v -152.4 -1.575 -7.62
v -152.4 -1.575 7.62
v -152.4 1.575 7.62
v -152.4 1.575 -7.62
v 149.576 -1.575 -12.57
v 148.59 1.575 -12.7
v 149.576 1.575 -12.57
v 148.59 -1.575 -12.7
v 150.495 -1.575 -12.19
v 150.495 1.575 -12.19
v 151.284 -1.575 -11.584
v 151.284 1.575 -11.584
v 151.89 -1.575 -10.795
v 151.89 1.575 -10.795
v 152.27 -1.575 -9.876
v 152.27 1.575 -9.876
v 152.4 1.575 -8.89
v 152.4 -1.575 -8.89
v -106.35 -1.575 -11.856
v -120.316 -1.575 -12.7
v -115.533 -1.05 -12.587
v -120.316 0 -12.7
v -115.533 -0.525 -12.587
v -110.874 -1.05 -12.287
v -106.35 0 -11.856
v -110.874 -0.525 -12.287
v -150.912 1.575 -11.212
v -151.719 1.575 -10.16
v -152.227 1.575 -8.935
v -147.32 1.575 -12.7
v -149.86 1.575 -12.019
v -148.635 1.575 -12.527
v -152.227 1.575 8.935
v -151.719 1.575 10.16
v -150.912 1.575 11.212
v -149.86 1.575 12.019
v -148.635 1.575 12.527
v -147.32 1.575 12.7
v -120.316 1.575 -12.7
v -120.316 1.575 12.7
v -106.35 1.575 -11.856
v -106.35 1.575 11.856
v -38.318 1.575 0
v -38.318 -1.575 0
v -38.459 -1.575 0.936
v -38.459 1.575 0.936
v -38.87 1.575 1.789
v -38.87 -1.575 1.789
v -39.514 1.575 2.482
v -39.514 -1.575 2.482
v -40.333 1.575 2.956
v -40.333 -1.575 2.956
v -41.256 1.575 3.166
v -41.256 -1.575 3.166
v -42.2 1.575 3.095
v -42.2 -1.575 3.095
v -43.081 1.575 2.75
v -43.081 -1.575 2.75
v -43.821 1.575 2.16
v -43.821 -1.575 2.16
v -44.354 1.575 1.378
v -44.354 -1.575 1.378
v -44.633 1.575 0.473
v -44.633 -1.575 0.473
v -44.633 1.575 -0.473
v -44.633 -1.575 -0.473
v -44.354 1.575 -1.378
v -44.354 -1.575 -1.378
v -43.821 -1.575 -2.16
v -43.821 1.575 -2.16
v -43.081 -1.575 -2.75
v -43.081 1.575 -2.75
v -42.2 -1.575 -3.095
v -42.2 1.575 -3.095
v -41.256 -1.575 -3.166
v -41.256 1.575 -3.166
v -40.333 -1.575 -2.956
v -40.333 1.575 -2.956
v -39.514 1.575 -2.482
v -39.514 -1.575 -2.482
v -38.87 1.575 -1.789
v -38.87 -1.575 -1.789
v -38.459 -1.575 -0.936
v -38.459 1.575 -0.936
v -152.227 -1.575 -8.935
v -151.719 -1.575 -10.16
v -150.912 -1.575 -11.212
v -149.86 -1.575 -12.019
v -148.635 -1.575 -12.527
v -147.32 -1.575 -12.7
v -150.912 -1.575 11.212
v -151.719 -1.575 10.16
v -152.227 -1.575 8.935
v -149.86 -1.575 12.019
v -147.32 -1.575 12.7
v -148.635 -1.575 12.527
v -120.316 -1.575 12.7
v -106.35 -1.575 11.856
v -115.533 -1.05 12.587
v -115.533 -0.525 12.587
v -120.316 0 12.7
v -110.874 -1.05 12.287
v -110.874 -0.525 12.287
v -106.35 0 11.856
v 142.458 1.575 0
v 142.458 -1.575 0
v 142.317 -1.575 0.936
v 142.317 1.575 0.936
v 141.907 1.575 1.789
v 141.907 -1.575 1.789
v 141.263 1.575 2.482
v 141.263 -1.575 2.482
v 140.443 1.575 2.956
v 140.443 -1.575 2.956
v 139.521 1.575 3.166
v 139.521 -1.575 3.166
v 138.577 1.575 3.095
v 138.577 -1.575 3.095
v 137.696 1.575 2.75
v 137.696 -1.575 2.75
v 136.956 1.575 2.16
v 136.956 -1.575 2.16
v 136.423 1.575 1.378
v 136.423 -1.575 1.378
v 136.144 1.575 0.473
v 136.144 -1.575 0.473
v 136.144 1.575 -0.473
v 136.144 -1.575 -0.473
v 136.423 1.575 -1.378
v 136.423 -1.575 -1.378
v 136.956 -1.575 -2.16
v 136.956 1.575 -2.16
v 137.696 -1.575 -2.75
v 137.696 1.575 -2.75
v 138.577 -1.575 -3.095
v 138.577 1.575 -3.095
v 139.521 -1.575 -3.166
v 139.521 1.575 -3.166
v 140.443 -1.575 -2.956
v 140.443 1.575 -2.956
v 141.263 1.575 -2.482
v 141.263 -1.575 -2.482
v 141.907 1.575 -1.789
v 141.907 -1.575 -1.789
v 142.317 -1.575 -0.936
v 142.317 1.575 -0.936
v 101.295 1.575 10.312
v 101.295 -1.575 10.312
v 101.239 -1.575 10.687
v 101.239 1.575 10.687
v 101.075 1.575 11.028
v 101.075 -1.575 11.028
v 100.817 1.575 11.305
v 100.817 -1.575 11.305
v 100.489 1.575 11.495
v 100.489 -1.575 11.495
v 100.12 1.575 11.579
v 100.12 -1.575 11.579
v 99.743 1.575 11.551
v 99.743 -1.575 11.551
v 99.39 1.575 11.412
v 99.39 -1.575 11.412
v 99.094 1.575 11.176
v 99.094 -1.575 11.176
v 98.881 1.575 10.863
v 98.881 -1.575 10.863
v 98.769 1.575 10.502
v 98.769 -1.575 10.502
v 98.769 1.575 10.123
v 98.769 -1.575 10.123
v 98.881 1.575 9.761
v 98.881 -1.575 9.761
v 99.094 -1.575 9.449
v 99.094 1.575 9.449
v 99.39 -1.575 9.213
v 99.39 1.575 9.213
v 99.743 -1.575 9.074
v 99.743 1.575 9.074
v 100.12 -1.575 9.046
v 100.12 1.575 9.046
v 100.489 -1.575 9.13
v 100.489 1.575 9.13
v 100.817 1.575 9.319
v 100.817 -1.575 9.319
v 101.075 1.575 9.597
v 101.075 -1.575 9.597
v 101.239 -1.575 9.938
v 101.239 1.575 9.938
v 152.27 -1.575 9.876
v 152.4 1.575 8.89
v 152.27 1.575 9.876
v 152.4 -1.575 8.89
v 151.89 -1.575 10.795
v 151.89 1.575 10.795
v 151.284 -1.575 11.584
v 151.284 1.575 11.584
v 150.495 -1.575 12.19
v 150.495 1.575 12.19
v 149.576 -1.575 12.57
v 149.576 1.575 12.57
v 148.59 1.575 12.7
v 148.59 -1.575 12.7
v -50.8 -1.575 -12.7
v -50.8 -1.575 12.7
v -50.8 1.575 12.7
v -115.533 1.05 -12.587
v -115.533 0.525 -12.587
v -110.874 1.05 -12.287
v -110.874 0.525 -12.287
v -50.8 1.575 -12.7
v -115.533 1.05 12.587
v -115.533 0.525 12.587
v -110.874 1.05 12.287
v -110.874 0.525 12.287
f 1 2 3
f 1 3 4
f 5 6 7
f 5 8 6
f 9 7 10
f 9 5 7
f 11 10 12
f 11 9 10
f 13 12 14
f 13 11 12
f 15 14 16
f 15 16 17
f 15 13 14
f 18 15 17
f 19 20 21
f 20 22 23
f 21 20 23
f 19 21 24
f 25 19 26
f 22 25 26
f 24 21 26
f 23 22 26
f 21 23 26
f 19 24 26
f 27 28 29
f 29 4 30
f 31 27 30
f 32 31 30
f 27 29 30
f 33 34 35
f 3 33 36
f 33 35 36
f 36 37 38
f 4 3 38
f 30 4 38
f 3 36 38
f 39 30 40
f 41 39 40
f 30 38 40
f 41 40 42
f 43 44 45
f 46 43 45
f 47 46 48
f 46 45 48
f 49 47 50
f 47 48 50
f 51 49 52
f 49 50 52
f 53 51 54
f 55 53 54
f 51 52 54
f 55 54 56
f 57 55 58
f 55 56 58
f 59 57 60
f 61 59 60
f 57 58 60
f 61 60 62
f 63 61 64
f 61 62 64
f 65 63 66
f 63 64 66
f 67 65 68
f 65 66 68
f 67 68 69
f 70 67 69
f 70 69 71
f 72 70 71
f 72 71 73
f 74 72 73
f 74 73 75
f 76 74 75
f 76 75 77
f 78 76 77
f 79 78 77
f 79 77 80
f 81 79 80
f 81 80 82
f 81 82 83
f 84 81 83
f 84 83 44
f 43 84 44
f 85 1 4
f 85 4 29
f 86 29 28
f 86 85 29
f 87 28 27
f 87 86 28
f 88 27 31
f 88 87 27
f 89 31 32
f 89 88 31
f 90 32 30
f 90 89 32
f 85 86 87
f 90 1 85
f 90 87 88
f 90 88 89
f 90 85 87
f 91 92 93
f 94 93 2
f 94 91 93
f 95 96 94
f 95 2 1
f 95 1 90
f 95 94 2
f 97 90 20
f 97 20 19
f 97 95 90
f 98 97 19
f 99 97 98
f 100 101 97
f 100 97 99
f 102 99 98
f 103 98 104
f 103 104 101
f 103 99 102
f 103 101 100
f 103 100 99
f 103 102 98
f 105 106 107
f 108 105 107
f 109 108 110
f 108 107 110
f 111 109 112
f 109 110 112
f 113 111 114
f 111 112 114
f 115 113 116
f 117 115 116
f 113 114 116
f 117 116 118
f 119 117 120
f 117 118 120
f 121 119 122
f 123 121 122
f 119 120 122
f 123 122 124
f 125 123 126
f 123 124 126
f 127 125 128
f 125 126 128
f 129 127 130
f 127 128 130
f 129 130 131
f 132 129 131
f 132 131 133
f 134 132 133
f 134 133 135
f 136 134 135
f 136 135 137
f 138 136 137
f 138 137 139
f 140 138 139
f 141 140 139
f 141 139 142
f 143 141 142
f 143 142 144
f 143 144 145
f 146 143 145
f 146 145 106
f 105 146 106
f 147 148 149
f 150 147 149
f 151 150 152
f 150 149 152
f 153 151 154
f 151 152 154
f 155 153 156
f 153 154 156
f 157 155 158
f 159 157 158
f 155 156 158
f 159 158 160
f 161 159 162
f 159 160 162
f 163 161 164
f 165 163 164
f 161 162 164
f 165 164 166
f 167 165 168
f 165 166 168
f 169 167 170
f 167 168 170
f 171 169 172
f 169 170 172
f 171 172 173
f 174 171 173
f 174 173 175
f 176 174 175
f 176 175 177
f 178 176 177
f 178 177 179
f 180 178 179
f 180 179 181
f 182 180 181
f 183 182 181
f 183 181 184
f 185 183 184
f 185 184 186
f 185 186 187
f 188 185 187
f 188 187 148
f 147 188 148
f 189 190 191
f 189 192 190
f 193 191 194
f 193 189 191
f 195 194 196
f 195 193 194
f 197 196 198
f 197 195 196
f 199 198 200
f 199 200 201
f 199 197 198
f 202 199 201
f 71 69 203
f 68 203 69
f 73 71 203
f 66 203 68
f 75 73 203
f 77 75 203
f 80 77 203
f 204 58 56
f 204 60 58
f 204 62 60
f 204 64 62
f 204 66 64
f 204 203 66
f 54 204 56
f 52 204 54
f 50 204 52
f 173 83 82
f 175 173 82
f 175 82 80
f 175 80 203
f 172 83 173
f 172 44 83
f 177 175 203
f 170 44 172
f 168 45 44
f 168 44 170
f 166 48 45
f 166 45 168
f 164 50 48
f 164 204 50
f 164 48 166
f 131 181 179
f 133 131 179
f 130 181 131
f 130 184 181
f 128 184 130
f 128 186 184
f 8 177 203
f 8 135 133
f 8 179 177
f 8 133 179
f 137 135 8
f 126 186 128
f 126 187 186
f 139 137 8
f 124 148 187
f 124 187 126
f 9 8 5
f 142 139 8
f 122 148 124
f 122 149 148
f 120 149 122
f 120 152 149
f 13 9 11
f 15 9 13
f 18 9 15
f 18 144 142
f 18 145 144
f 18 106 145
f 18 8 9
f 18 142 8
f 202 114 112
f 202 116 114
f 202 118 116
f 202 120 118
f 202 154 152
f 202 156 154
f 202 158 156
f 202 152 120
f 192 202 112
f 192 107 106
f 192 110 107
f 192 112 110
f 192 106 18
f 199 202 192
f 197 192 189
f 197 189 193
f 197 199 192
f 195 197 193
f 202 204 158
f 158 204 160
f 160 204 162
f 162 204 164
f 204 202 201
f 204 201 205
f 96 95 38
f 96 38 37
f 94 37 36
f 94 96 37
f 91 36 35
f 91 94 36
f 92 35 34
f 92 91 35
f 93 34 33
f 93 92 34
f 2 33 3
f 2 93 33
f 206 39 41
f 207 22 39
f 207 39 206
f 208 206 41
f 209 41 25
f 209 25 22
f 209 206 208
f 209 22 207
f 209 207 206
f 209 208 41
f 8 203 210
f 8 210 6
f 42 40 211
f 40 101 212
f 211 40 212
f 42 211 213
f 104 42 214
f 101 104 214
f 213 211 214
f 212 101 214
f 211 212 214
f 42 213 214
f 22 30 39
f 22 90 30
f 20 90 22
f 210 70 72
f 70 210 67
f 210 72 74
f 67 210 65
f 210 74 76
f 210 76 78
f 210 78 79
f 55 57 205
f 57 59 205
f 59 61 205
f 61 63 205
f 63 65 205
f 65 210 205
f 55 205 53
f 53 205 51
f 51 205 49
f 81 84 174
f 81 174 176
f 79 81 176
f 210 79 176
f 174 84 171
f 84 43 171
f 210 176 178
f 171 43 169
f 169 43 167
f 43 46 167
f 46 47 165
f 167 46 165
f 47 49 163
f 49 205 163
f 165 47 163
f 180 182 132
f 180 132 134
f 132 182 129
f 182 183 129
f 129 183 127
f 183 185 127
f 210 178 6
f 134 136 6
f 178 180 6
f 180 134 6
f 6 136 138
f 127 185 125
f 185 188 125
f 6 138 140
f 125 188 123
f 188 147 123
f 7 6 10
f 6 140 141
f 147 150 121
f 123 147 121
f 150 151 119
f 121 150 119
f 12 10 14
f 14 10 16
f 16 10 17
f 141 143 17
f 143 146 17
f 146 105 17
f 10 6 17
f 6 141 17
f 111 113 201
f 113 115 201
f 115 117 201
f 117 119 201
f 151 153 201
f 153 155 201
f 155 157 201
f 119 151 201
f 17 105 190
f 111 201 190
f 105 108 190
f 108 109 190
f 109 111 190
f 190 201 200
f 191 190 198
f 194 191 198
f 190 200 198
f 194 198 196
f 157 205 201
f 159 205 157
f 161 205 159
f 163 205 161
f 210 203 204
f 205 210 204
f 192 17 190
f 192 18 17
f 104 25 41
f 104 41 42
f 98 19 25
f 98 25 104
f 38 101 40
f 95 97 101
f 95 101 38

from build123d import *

# Parameters (mm, degrees)
F1_DEPTH = 1.5748
F3_DEPTH = 3.175
F4_R     = 3.175
F4_R_2   = 1.27
F5_DEPTH = 3.175
F6_DEPTH = 1.5748


with BuildPart() as f1:
    # F0 (on Front) → F1 (new body, symmetric)
    with BuildSketch(Plane.XZ):
        with BuildLine():
            ThreePointArc((152.4, 8.89), (151.284077, 11.584077), (148.59, 12.7))
            Line((148.59, 12.7), (-71.287103, 12.7))
            add(Edge.make_bspline(
                [(-106.3498, 11.856413), (-91.804659, 10.300854), (-79.577204, 7.582657), (-71.287103, 12.7)],
                knots=[11.492972, 11.492972, 11.492972, 11.492972, 49.028687, 49.028687, 49.028687, 49.028687], degree=3))
            Line((-106.3498, 11.856413), (-106.3498, -11.856413))
            add(Edge.make_bspline(
                [(-106.3498, -11.856413), (-91.804659, -10.300854), (-79.577204, -7.582657), (-71.287103, -12.7)],
                knots=[11.492972, 11.492972, 11.492972, 11.492972, 49.028687, 49.028687, 49.028687, 49.028687], degree=3))
            Line((-71.287103, -12.7), (148.59, -12.7))
            ThreePointArc((148.59, -12.7), (151.284077, -11.584077), (152.4, -8.89))
            Line((152.4, -8.89), (152.4, 8.89))
        make_face()
    extrude(amount=F1_DEPTH, both=True)

    # F2 (on face) → F3 (cut)
    with BuildSketch(Plane.XZ.offset(1.5748)):
        with BuildLine():
            Line((-50.8, -12.7), (-50.8, 12.7))
            Line((-50.8, 12.7), (-71.287103, 12.7))
            add(Edge.make_bspline(
                [(-106.3498, 11.856413), (-91.804659, 10.300854), (-79.577204, 7.582657), (-71.287103, 12.7)],
                knots=[11.492972, 11.492972, 11.492972, 11.492972, 49.028687, 49.028687, 49.028687, 49.028687], degree=3))
            Line((-106.3498, 11.856413), (-106.3498, -11.856413))
            add(Edge.make_bspline(
                [(-106.3498, -11.856413), (-91.804659, -10.300854), (-79.577204, -7.582657), (-71.287103, -12.7)],
                knots=[11.492972, 11.492972, 11.492972, 11.492972, 49.028687, 49.028687, 49.028687, 49.028687], degree=3))
            Line((-71.287103, -12.7), (-50.8, -12.7))
        make_face()
    extrude(amount=-F3_DEPTH, mode=Mode.SUBTRACT)

    # F4 (on face) → F5 (cut)
    with BuildSketch(Plane.XZ.offset(1.5748)):
        with Locations((-41.493278, 0)):
            Circle(F4_R)
        with Locations((139.283278, 0)):
            Circle(F4_R)
        with Locations((100.0252, 10.3124)):
            Circle(F4_R_2)
    extrude(amount=-F5_DEPTH, mode=Mode.SUBTRACT)


with BuildPart() as f6:
    # F0 (on Front) → F6 (new body, symmetric)
    with BuildSketch(Plane.XZ):
        with BuildLine():
            Line((-106.3498, -11.856413), (-106.3498, 11.856413))
            add(Edge.make_bspline(
                [(-120.31579, 12.7), (-115.47417, 12.7), (-110.803343, 12.332706), (-106.3498, 11.856413)],
                knots=[0, 0, 0, 0, 11.492972, 11.492972, 11.492972, 11.492972], degree=3))
            Line((-120.31579, 12.7), (-147.32, 12.7))
            ThreePointArc((-147.32, 12.7), (-150.912102, 11.212102), (-152.4, 7.62))
            Line((-152.4, 7.62), (-152.4, -7.62))
            ThreePointArc((-152.4, -7.62), (-150.912102, -11.212102), (-147.32, -12.7))
            Line((-147.32, -12.7), (-120.31579, -12.7))
            add(Edge.make_bspline(
                [(-120.31579, -12.7), (-115.47417, -12.7), (-110.803343, -12.332706), (-106.3498, -11.856413)],
                knots=[0, 0, 0, 0, 11.492972, 11.492972, 11.492972, 11.492972], degree=3))
        make_face()
    extrude(amount=F6_DEPTH, both=True)


solid = Compound([f1.part, f6.part])
